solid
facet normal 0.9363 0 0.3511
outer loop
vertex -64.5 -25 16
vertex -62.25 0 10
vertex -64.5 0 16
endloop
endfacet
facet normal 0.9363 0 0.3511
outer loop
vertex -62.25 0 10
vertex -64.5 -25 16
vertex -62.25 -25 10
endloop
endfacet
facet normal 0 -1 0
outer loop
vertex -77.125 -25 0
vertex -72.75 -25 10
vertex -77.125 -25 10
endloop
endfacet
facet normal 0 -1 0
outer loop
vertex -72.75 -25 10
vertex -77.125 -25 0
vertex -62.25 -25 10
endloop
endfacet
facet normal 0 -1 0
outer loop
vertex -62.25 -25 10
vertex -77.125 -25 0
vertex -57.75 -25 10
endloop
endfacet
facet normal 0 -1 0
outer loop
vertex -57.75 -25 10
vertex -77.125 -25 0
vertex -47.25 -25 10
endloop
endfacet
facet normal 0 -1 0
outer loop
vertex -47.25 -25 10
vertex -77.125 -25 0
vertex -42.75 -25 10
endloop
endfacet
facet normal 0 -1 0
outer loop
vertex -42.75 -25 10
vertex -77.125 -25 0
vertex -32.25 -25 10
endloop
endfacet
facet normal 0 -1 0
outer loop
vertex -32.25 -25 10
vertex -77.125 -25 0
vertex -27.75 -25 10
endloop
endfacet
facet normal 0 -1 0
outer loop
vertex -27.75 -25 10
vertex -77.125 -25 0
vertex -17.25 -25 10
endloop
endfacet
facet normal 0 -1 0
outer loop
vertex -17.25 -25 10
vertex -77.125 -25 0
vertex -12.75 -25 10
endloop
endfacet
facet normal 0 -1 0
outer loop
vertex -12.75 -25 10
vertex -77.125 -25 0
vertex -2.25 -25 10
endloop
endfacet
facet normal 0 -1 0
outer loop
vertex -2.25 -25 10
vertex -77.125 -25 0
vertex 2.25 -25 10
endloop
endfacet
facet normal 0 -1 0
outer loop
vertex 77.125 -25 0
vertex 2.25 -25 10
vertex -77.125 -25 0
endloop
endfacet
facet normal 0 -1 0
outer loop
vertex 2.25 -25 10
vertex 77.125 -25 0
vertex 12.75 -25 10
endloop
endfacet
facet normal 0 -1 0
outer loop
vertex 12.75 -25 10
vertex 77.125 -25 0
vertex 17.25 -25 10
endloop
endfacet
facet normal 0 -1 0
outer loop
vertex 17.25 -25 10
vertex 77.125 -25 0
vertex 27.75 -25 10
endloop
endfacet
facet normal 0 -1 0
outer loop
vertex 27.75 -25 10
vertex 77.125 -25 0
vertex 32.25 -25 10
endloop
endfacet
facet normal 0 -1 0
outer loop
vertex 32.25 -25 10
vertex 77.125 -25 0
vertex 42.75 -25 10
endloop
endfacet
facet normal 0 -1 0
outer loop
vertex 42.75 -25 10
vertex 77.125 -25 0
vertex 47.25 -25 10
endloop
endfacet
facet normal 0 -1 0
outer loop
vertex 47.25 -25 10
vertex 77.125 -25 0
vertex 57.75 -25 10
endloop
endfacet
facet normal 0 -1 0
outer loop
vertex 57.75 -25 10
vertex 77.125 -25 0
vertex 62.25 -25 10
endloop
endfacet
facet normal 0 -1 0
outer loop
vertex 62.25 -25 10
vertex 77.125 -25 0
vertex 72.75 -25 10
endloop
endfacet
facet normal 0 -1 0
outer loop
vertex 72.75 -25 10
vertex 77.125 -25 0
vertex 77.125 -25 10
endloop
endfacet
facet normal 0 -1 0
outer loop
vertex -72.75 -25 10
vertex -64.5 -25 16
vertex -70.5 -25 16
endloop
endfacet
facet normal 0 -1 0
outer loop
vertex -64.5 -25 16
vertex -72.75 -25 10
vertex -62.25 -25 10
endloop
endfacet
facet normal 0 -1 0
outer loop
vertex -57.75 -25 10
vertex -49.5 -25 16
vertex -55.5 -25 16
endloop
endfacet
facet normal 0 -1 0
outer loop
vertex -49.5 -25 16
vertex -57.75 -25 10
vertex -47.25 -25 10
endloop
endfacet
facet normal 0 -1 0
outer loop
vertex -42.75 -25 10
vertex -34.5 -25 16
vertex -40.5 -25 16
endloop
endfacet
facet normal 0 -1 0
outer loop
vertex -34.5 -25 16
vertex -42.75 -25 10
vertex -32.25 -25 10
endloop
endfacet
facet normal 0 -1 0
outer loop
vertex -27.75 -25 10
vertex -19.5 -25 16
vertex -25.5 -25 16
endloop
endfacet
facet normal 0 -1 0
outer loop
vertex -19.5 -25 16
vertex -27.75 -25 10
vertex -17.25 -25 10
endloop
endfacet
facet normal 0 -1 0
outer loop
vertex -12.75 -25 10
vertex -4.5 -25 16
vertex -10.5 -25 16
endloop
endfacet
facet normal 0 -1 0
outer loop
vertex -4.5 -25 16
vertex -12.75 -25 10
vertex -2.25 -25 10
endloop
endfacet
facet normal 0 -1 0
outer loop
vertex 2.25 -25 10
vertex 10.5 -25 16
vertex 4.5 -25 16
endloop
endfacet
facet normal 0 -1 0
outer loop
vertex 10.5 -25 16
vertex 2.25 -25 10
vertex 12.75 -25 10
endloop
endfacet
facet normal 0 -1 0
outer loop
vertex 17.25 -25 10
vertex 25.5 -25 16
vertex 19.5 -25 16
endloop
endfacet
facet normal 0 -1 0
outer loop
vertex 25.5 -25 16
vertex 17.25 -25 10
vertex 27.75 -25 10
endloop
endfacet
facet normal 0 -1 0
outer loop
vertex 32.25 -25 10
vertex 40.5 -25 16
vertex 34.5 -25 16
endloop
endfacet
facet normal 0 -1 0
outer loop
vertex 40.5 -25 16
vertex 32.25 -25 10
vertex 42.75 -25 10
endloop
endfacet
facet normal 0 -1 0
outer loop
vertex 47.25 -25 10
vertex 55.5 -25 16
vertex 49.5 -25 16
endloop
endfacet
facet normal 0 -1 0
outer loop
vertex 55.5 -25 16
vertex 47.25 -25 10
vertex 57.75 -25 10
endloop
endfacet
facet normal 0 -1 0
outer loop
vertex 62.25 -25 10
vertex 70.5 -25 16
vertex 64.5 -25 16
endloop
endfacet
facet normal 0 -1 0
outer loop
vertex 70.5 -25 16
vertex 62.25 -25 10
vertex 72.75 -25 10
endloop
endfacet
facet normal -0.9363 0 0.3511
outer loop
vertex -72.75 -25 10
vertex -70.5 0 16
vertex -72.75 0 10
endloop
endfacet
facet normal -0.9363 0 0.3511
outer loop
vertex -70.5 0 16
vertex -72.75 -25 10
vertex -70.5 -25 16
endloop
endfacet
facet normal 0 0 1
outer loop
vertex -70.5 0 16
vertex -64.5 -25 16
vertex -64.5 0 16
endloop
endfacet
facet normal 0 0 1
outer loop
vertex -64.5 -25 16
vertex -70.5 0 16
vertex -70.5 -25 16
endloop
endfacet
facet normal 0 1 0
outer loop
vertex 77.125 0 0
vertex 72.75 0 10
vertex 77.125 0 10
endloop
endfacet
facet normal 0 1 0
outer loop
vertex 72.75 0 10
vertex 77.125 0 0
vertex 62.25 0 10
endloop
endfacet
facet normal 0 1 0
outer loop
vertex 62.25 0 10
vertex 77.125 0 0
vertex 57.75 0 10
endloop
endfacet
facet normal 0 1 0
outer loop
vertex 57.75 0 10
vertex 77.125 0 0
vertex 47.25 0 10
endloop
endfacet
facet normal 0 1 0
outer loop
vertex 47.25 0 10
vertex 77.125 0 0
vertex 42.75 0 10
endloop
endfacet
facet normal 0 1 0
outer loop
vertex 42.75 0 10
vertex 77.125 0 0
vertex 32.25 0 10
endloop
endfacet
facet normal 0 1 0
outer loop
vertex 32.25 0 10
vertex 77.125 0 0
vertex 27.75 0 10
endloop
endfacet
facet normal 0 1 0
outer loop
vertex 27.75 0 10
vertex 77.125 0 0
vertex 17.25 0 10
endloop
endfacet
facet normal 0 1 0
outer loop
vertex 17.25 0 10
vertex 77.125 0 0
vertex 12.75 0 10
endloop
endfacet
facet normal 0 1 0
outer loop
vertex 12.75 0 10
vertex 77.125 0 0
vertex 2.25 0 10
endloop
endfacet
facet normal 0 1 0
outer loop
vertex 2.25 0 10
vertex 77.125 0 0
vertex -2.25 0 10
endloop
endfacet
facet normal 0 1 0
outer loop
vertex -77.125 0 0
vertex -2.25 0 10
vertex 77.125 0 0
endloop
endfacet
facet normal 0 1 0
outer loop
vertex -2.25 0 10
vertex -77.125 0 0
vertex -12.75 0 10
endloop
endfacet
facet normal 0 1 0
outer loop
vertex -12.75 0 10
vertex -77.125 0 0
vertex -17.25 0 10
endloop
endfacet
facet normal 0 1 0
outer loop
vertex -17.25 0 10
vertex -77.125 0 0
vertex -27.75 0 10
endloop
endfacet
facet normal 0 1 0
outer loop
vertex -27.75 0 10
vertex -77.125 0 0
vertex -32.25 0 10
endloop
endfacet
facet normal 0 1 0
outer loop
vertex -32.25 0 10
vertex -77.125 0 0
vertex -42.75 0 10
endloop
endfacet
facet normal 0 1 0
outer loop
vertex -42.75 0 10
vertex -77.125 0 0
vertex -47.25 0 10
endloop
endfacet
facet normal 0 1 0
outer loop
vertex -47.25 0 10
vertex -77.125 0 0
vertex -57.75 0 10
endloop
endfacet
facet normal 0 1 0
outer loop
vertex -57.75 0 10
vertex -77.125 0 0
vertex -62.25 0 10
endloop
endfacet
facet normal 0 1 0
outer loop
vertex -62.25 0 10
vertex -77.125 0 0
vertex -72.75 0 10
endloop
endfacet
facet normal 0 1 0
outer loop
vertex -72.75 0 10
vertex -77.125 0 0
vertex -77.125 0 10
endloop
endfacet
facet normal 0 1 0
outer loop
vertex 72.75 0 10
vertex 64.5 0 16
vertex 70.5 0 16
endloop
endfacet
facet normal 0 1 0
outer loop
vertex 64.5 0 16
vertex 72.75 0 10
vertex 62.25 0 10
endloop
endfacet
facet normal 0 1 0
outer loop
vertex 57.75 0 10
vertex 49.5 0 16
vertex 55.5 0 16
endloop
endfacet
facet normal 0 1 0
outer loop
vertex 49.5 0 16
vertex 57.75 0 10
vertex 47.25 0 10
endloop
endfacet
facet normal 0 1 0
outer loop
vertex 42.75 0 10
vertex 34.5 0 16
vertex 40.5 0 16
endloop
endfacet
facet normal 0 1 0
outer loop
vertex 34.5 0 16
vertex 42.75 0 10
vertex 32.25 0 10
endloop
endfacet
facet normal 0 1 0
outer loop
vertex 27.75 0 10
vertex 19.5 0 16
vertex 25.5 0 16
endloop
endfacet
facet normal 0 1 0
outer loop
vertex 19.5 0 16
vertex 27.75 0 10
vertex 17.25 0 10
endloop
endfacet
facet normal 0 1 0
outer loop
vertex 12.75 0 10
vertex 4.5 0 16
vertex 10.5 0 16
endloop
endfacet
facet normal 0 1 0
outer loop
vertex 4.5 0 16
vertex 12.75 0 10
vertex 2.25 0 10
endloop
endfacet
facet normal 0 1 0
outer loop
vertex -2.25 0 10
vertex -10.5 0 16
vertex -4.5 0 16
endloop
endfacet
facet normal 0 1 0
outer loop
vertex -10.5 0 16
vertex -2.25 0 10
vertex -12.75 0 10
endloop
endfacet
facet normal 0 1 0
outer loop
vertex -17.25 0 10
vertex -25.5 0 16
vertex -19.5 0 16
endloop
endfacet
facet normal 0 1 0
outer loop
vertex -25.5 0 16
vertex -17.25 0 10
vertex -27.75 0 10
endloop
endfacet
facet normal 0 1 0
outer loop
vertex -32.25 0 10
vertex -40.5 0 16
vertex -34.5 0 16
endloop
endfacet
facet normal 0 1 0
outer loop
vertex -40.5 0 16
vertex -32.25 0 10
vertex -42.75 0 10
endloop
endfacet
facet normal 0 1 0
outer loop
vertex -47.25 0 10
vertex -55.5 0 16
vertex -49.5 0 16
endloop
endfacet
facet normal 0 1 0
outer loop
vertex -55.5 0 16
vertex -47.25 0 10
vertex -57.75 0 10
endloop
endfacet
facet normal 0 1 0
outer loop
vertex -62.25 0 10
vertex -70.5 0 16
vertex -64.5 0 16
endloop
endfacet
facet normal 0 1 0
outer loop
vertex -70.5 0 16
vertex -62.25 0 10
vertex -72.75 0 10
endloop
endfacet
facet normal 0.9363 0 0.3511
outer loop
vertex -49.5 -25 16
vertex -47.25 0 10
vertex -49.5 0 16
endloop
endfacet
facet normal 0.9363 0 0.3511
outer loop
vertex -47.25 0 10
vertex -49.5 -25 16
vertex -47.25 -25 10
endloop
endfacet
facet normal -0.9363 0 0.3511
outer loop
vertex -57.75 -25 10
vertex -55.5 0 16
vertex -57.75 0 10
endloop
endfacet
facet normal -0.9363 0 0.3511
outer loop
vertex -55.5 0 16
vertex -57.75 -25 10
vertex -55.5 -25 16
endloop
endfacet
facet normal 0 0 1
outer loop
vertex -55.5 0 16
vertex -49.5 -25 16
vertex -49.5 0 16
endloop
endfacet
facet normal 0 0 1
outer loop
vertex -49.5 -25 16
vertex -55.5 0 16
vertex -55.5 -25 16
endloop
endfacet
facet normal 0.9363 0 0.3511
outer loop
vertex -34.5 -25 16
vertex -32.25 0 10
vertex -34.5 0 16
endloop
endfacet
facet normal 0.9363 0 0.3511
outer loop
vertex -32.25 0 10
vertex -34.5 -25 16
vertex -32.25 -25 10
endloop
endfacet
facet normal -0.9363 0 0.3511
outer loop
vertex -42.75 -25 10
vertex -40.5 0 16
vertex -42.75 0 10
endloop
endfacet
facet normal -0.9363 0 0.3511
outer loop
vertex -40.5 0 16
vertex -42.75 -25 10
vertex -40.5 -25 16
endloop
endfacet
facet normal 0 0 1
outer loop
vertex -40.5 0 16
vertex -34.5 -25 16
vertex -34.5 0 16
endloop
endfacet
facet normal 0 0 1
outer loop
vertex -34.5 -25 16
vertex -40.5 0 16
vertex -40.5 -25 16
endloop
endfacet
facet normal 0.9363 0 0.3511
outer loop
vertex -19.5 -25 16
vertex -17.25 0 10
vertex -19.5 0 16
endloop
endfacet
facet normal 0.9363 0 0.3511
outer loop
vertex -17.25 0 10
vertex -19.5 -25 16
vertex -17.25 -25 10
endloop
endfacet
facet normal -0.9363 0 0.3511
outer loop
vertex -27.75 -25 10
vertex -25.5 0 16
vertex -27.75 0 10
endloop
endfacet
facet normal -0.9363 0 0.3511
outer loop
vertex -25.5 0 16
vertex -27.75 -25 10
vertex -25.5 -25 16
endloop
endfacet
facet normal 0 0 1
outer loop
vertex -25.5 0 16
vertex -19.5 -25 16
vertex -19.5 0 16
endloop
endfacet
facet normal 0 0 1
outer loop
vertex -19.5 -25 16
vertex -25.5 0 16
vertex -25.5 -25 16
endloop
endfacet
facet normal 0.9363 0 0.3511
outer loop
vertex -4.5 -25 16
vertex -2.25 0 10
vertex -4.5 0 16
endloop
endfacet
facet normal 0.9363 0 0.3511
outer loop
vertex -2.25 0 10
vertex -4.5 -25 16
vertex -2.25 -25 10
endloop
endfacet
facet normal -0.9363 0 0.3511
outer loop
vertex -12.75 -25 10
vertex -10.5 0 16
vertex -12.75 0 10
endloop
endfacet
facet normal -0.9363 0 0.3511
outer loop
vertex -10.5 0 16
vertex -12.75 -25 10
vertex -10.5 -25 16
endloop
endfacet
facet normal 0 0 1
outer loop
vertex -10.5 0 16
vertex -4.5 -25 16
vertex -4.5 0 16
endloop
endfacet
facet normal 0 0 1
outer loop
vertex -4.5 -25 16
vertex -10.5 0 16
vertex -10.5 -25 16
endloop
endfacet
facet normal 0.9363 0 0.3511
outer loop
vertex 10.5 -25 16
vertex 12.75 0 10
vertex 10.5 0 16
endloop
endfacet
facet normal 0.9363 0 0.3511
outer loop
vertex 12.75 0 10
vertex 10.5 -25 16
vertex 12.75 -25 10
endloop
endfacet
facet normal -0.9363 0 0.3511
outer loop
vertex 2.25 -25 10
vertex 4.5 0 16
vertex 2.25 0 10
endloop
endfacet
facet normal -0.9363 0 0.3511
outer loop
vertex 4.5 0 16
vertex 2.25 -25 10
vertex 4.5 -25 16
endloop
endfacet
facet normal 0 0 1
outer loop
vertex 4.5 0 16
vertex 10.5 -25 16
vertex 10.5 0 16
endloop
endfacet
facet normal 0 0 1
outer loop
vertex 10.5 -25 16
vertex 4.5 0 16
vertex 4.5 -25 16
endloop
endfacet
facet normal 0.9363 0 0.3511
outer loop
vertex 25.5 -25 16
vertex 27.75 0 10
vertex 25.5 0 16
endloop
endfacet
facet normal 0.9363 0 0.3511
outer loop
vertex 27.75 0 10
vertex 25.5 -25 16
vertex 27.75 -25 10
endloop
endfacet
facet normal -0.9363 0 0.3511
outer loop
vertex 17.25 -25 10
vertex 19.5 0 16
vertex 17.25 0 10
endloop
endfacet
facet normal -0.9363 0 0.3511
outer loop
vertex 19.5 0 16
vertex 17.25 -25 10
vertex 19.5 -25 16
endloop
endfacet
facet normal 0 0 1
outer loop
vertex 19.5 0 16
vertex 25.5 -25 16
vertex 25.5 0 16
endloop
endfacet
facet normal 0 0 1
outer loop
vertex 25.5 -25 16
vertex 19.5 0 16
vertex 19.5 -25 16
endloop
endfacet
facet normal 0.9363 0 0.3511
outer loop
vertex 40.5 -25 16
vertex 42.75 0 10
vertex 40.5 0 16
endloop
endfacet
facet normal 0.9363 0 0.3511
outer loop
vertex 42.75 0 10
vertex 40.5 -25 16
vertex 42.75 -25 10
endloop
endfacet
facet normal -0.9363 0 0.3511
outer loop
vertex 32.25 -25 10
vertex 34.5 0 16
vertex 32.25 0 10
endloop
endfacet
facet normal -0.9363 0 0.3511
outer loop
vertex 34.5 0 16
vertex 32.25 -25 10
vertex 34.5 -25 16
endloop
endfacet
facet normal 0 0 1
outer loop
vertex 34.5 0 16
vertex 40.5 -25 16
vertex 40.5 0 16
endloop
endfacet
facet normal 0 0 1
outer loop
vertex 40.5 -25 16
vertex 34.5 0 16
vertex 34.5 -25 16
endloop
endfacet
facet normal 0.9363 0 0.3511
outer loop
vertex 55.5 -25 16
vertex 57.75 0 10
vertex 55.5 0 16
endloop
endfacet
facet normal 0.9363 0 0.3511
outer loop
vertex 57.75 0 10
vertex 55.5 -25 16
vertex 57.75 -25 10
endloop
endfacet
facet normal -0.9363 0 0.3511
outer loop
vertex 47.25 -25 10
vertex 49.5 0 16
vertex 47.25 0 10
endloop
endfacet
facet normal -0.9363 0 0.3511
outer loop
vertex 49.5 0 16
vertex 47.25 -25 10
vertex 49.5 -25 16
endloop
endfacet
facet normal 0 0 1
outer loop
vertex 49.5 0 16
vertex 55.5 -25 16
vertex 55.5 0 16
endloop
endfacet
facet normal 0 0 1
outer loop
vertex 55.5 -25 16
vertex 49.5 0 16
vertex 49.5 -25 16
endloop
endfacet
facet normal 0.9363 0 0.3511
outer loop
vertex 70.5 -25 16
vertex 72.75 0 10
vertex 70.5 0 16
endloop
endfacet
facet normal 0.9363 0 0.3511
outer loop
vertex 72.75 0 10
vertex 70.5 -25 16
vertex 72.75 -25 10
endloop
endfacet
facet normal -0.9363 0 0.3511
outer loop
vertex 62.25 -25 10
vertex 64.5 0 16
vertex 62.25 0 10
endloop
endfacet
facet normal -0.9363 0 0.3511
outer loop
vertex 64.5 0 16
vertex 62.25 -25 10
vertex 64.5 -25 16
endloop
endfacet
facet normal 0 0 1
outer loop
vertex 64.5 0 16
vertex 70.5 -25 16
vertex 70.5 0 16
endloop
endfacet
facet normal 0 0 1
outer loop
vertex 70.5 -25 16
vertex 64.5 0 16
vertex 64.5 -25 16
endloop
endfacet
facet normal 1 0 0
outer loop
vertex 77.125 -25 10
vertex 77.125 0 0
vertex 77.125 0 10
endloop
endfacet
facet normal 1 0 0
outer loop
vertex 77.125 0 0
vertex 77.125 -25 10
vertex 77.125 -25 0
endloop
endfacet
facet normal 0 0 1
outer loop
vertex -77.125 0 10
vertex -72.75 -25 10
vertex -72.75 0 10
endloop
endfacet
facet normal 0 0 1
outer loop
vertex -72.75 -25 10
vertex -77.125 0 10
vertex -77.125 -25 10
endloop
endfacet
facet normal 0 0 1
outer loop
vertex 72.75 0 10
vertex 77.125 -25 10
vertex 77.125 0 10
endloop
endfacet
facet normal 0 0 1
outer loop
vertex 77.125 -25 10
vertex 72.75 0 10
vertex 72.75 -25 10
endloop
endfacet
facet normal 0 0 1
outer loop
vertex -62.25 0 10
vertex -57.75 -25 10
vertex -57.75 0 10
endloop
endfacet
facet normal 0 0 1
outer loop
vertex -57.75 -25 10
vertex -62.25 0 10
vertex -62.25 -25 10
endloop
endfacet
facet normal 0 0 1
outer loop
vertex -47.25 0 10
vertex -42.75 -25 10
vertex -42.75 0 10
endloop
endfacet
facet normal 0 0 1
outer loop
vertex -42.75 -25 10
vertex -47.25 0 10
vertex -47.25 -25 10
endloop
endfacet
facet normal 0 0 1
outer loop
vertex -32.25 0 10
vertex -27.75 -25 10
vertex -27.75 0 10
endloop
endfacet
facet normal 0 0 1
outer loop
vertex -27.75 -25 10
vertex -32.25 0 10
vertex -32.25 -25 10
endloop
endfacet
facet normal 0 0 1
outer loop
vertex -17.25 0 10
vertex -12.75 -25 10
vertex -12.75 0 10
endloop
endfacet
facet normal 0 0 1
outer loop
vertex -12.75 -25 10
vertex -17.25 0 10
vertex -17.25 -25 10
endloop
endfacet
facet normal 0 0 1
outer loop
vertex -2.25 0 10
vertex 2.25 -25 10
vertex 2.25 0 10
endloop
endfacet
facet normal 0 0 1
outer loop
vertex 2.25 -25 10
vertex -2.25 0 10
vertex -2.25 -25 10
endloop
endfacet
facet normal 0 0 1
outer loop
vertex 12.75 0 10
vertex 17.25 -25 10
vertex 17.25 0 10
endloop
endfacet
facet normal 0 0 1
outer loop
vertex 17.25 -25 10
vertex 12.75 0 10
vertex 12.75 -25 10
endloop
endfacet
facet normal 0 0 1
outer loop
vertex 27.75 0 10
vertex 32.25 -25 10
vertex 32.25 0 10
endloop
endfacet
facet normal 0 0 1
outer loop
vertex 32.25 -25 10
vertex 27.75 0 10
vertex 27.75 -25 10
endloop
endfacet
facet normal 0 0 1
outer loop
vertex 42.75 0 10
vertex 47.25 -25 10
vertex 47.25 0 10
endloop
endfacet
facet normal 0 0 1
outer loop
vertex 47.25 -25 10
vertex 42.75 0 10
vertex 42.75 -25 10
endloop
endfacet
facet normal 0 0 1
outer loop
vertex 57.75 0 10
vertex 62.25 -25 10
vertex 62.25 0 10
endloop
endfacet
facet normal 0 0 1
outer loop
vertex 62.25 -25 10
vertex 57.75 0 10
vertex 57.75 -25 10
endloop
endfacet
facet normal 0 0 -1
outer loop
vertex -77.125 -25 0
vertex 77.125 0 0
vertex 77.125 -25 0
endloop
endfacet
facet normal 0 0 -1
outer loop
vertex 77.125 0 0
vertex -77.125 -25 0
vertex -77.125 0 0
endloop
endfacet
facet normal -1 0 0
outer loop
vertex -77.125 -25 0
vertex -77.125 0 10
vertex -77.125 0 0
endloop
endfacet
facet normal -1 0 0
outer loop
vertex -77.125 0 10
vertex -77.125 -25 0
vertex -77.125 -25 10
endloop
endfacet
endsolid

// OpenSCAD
$fn = 32;

// ----------------------------------------------------------------------
// Toothed rack, 10 teeth
// 15 mm pitch, 6 mm teeth
// ----------------------------------------------------------------------

// --- parameters (mm) ---
bar_w = 25;      // bar width (Y)
bar_h = 10;      // bar height (Z)
teeth = 10;      // number of teeth
pitch = 15;      // tooth pitch
tooth_h = 6;     // tooth height above the bar
root_w = 11.25;  // tooth width at the root
crest_w = 6;     // tooth width at the crest

// --- derived feature positions (mm) ---
span = (teeth - 1) * pitch;  // = 135   distance between the outer teeth
bar_l = span + root_w + 8;   // = 154.25   bar length: teeth plus 4 mm at each end
tooth_x = -span / 2;         // = -67.5   X of the first tooth
height = bar_h + tooth_h;    // = 16   overall height
feature_centers = [
  [tooth_x + 0 * pitch, -bar_w / 2],
  [tooth_x + 1 * pitch, -bar_w / 2],
  [tooth_x + 2 * pitch, -bar_w / 2],
  [tooth_x + 3 * pitch, -bar_w / 2],
  [tooth_x + 4 * pitch, -bar_w / 2],
  [tooth_x + 5 * pitch, -bar_w / 2],
  [tooth_x + 6 * pitch, -bar_w / 2],
  [tooth_x + 7 * pitch, -bar_w / 2],
  [tooth_x + 8 * pitch, -bar_w / 2],
  [tooth_x + 9 * pitch, -bar_w / 2]
];   // tooth centre line, drives the tooth loop

// bar with a rack of teeth, one extruded trapezoium per centre
module rack_tooth() {
  linear_extrude(height = bar_w)
    polygon(points = [
      [0, 0],
      [root_w, 0],
      [root_w / 2 + crest_w / 2, tooth_h + 1],
      [root_w / 2 - crest_w / 2, tooth_h + 1]
    ]);
}

union() {
  translate([-bar_l / 2, -bar_w, 0]) cube([bar_l, bar_w, bar_h]);
  for (centre = feature_centers)
    translate([centre[0] - root_w / 2, 0, bar_h - 1]) rotate([90, 0, 0]) rack_tooth();
}
